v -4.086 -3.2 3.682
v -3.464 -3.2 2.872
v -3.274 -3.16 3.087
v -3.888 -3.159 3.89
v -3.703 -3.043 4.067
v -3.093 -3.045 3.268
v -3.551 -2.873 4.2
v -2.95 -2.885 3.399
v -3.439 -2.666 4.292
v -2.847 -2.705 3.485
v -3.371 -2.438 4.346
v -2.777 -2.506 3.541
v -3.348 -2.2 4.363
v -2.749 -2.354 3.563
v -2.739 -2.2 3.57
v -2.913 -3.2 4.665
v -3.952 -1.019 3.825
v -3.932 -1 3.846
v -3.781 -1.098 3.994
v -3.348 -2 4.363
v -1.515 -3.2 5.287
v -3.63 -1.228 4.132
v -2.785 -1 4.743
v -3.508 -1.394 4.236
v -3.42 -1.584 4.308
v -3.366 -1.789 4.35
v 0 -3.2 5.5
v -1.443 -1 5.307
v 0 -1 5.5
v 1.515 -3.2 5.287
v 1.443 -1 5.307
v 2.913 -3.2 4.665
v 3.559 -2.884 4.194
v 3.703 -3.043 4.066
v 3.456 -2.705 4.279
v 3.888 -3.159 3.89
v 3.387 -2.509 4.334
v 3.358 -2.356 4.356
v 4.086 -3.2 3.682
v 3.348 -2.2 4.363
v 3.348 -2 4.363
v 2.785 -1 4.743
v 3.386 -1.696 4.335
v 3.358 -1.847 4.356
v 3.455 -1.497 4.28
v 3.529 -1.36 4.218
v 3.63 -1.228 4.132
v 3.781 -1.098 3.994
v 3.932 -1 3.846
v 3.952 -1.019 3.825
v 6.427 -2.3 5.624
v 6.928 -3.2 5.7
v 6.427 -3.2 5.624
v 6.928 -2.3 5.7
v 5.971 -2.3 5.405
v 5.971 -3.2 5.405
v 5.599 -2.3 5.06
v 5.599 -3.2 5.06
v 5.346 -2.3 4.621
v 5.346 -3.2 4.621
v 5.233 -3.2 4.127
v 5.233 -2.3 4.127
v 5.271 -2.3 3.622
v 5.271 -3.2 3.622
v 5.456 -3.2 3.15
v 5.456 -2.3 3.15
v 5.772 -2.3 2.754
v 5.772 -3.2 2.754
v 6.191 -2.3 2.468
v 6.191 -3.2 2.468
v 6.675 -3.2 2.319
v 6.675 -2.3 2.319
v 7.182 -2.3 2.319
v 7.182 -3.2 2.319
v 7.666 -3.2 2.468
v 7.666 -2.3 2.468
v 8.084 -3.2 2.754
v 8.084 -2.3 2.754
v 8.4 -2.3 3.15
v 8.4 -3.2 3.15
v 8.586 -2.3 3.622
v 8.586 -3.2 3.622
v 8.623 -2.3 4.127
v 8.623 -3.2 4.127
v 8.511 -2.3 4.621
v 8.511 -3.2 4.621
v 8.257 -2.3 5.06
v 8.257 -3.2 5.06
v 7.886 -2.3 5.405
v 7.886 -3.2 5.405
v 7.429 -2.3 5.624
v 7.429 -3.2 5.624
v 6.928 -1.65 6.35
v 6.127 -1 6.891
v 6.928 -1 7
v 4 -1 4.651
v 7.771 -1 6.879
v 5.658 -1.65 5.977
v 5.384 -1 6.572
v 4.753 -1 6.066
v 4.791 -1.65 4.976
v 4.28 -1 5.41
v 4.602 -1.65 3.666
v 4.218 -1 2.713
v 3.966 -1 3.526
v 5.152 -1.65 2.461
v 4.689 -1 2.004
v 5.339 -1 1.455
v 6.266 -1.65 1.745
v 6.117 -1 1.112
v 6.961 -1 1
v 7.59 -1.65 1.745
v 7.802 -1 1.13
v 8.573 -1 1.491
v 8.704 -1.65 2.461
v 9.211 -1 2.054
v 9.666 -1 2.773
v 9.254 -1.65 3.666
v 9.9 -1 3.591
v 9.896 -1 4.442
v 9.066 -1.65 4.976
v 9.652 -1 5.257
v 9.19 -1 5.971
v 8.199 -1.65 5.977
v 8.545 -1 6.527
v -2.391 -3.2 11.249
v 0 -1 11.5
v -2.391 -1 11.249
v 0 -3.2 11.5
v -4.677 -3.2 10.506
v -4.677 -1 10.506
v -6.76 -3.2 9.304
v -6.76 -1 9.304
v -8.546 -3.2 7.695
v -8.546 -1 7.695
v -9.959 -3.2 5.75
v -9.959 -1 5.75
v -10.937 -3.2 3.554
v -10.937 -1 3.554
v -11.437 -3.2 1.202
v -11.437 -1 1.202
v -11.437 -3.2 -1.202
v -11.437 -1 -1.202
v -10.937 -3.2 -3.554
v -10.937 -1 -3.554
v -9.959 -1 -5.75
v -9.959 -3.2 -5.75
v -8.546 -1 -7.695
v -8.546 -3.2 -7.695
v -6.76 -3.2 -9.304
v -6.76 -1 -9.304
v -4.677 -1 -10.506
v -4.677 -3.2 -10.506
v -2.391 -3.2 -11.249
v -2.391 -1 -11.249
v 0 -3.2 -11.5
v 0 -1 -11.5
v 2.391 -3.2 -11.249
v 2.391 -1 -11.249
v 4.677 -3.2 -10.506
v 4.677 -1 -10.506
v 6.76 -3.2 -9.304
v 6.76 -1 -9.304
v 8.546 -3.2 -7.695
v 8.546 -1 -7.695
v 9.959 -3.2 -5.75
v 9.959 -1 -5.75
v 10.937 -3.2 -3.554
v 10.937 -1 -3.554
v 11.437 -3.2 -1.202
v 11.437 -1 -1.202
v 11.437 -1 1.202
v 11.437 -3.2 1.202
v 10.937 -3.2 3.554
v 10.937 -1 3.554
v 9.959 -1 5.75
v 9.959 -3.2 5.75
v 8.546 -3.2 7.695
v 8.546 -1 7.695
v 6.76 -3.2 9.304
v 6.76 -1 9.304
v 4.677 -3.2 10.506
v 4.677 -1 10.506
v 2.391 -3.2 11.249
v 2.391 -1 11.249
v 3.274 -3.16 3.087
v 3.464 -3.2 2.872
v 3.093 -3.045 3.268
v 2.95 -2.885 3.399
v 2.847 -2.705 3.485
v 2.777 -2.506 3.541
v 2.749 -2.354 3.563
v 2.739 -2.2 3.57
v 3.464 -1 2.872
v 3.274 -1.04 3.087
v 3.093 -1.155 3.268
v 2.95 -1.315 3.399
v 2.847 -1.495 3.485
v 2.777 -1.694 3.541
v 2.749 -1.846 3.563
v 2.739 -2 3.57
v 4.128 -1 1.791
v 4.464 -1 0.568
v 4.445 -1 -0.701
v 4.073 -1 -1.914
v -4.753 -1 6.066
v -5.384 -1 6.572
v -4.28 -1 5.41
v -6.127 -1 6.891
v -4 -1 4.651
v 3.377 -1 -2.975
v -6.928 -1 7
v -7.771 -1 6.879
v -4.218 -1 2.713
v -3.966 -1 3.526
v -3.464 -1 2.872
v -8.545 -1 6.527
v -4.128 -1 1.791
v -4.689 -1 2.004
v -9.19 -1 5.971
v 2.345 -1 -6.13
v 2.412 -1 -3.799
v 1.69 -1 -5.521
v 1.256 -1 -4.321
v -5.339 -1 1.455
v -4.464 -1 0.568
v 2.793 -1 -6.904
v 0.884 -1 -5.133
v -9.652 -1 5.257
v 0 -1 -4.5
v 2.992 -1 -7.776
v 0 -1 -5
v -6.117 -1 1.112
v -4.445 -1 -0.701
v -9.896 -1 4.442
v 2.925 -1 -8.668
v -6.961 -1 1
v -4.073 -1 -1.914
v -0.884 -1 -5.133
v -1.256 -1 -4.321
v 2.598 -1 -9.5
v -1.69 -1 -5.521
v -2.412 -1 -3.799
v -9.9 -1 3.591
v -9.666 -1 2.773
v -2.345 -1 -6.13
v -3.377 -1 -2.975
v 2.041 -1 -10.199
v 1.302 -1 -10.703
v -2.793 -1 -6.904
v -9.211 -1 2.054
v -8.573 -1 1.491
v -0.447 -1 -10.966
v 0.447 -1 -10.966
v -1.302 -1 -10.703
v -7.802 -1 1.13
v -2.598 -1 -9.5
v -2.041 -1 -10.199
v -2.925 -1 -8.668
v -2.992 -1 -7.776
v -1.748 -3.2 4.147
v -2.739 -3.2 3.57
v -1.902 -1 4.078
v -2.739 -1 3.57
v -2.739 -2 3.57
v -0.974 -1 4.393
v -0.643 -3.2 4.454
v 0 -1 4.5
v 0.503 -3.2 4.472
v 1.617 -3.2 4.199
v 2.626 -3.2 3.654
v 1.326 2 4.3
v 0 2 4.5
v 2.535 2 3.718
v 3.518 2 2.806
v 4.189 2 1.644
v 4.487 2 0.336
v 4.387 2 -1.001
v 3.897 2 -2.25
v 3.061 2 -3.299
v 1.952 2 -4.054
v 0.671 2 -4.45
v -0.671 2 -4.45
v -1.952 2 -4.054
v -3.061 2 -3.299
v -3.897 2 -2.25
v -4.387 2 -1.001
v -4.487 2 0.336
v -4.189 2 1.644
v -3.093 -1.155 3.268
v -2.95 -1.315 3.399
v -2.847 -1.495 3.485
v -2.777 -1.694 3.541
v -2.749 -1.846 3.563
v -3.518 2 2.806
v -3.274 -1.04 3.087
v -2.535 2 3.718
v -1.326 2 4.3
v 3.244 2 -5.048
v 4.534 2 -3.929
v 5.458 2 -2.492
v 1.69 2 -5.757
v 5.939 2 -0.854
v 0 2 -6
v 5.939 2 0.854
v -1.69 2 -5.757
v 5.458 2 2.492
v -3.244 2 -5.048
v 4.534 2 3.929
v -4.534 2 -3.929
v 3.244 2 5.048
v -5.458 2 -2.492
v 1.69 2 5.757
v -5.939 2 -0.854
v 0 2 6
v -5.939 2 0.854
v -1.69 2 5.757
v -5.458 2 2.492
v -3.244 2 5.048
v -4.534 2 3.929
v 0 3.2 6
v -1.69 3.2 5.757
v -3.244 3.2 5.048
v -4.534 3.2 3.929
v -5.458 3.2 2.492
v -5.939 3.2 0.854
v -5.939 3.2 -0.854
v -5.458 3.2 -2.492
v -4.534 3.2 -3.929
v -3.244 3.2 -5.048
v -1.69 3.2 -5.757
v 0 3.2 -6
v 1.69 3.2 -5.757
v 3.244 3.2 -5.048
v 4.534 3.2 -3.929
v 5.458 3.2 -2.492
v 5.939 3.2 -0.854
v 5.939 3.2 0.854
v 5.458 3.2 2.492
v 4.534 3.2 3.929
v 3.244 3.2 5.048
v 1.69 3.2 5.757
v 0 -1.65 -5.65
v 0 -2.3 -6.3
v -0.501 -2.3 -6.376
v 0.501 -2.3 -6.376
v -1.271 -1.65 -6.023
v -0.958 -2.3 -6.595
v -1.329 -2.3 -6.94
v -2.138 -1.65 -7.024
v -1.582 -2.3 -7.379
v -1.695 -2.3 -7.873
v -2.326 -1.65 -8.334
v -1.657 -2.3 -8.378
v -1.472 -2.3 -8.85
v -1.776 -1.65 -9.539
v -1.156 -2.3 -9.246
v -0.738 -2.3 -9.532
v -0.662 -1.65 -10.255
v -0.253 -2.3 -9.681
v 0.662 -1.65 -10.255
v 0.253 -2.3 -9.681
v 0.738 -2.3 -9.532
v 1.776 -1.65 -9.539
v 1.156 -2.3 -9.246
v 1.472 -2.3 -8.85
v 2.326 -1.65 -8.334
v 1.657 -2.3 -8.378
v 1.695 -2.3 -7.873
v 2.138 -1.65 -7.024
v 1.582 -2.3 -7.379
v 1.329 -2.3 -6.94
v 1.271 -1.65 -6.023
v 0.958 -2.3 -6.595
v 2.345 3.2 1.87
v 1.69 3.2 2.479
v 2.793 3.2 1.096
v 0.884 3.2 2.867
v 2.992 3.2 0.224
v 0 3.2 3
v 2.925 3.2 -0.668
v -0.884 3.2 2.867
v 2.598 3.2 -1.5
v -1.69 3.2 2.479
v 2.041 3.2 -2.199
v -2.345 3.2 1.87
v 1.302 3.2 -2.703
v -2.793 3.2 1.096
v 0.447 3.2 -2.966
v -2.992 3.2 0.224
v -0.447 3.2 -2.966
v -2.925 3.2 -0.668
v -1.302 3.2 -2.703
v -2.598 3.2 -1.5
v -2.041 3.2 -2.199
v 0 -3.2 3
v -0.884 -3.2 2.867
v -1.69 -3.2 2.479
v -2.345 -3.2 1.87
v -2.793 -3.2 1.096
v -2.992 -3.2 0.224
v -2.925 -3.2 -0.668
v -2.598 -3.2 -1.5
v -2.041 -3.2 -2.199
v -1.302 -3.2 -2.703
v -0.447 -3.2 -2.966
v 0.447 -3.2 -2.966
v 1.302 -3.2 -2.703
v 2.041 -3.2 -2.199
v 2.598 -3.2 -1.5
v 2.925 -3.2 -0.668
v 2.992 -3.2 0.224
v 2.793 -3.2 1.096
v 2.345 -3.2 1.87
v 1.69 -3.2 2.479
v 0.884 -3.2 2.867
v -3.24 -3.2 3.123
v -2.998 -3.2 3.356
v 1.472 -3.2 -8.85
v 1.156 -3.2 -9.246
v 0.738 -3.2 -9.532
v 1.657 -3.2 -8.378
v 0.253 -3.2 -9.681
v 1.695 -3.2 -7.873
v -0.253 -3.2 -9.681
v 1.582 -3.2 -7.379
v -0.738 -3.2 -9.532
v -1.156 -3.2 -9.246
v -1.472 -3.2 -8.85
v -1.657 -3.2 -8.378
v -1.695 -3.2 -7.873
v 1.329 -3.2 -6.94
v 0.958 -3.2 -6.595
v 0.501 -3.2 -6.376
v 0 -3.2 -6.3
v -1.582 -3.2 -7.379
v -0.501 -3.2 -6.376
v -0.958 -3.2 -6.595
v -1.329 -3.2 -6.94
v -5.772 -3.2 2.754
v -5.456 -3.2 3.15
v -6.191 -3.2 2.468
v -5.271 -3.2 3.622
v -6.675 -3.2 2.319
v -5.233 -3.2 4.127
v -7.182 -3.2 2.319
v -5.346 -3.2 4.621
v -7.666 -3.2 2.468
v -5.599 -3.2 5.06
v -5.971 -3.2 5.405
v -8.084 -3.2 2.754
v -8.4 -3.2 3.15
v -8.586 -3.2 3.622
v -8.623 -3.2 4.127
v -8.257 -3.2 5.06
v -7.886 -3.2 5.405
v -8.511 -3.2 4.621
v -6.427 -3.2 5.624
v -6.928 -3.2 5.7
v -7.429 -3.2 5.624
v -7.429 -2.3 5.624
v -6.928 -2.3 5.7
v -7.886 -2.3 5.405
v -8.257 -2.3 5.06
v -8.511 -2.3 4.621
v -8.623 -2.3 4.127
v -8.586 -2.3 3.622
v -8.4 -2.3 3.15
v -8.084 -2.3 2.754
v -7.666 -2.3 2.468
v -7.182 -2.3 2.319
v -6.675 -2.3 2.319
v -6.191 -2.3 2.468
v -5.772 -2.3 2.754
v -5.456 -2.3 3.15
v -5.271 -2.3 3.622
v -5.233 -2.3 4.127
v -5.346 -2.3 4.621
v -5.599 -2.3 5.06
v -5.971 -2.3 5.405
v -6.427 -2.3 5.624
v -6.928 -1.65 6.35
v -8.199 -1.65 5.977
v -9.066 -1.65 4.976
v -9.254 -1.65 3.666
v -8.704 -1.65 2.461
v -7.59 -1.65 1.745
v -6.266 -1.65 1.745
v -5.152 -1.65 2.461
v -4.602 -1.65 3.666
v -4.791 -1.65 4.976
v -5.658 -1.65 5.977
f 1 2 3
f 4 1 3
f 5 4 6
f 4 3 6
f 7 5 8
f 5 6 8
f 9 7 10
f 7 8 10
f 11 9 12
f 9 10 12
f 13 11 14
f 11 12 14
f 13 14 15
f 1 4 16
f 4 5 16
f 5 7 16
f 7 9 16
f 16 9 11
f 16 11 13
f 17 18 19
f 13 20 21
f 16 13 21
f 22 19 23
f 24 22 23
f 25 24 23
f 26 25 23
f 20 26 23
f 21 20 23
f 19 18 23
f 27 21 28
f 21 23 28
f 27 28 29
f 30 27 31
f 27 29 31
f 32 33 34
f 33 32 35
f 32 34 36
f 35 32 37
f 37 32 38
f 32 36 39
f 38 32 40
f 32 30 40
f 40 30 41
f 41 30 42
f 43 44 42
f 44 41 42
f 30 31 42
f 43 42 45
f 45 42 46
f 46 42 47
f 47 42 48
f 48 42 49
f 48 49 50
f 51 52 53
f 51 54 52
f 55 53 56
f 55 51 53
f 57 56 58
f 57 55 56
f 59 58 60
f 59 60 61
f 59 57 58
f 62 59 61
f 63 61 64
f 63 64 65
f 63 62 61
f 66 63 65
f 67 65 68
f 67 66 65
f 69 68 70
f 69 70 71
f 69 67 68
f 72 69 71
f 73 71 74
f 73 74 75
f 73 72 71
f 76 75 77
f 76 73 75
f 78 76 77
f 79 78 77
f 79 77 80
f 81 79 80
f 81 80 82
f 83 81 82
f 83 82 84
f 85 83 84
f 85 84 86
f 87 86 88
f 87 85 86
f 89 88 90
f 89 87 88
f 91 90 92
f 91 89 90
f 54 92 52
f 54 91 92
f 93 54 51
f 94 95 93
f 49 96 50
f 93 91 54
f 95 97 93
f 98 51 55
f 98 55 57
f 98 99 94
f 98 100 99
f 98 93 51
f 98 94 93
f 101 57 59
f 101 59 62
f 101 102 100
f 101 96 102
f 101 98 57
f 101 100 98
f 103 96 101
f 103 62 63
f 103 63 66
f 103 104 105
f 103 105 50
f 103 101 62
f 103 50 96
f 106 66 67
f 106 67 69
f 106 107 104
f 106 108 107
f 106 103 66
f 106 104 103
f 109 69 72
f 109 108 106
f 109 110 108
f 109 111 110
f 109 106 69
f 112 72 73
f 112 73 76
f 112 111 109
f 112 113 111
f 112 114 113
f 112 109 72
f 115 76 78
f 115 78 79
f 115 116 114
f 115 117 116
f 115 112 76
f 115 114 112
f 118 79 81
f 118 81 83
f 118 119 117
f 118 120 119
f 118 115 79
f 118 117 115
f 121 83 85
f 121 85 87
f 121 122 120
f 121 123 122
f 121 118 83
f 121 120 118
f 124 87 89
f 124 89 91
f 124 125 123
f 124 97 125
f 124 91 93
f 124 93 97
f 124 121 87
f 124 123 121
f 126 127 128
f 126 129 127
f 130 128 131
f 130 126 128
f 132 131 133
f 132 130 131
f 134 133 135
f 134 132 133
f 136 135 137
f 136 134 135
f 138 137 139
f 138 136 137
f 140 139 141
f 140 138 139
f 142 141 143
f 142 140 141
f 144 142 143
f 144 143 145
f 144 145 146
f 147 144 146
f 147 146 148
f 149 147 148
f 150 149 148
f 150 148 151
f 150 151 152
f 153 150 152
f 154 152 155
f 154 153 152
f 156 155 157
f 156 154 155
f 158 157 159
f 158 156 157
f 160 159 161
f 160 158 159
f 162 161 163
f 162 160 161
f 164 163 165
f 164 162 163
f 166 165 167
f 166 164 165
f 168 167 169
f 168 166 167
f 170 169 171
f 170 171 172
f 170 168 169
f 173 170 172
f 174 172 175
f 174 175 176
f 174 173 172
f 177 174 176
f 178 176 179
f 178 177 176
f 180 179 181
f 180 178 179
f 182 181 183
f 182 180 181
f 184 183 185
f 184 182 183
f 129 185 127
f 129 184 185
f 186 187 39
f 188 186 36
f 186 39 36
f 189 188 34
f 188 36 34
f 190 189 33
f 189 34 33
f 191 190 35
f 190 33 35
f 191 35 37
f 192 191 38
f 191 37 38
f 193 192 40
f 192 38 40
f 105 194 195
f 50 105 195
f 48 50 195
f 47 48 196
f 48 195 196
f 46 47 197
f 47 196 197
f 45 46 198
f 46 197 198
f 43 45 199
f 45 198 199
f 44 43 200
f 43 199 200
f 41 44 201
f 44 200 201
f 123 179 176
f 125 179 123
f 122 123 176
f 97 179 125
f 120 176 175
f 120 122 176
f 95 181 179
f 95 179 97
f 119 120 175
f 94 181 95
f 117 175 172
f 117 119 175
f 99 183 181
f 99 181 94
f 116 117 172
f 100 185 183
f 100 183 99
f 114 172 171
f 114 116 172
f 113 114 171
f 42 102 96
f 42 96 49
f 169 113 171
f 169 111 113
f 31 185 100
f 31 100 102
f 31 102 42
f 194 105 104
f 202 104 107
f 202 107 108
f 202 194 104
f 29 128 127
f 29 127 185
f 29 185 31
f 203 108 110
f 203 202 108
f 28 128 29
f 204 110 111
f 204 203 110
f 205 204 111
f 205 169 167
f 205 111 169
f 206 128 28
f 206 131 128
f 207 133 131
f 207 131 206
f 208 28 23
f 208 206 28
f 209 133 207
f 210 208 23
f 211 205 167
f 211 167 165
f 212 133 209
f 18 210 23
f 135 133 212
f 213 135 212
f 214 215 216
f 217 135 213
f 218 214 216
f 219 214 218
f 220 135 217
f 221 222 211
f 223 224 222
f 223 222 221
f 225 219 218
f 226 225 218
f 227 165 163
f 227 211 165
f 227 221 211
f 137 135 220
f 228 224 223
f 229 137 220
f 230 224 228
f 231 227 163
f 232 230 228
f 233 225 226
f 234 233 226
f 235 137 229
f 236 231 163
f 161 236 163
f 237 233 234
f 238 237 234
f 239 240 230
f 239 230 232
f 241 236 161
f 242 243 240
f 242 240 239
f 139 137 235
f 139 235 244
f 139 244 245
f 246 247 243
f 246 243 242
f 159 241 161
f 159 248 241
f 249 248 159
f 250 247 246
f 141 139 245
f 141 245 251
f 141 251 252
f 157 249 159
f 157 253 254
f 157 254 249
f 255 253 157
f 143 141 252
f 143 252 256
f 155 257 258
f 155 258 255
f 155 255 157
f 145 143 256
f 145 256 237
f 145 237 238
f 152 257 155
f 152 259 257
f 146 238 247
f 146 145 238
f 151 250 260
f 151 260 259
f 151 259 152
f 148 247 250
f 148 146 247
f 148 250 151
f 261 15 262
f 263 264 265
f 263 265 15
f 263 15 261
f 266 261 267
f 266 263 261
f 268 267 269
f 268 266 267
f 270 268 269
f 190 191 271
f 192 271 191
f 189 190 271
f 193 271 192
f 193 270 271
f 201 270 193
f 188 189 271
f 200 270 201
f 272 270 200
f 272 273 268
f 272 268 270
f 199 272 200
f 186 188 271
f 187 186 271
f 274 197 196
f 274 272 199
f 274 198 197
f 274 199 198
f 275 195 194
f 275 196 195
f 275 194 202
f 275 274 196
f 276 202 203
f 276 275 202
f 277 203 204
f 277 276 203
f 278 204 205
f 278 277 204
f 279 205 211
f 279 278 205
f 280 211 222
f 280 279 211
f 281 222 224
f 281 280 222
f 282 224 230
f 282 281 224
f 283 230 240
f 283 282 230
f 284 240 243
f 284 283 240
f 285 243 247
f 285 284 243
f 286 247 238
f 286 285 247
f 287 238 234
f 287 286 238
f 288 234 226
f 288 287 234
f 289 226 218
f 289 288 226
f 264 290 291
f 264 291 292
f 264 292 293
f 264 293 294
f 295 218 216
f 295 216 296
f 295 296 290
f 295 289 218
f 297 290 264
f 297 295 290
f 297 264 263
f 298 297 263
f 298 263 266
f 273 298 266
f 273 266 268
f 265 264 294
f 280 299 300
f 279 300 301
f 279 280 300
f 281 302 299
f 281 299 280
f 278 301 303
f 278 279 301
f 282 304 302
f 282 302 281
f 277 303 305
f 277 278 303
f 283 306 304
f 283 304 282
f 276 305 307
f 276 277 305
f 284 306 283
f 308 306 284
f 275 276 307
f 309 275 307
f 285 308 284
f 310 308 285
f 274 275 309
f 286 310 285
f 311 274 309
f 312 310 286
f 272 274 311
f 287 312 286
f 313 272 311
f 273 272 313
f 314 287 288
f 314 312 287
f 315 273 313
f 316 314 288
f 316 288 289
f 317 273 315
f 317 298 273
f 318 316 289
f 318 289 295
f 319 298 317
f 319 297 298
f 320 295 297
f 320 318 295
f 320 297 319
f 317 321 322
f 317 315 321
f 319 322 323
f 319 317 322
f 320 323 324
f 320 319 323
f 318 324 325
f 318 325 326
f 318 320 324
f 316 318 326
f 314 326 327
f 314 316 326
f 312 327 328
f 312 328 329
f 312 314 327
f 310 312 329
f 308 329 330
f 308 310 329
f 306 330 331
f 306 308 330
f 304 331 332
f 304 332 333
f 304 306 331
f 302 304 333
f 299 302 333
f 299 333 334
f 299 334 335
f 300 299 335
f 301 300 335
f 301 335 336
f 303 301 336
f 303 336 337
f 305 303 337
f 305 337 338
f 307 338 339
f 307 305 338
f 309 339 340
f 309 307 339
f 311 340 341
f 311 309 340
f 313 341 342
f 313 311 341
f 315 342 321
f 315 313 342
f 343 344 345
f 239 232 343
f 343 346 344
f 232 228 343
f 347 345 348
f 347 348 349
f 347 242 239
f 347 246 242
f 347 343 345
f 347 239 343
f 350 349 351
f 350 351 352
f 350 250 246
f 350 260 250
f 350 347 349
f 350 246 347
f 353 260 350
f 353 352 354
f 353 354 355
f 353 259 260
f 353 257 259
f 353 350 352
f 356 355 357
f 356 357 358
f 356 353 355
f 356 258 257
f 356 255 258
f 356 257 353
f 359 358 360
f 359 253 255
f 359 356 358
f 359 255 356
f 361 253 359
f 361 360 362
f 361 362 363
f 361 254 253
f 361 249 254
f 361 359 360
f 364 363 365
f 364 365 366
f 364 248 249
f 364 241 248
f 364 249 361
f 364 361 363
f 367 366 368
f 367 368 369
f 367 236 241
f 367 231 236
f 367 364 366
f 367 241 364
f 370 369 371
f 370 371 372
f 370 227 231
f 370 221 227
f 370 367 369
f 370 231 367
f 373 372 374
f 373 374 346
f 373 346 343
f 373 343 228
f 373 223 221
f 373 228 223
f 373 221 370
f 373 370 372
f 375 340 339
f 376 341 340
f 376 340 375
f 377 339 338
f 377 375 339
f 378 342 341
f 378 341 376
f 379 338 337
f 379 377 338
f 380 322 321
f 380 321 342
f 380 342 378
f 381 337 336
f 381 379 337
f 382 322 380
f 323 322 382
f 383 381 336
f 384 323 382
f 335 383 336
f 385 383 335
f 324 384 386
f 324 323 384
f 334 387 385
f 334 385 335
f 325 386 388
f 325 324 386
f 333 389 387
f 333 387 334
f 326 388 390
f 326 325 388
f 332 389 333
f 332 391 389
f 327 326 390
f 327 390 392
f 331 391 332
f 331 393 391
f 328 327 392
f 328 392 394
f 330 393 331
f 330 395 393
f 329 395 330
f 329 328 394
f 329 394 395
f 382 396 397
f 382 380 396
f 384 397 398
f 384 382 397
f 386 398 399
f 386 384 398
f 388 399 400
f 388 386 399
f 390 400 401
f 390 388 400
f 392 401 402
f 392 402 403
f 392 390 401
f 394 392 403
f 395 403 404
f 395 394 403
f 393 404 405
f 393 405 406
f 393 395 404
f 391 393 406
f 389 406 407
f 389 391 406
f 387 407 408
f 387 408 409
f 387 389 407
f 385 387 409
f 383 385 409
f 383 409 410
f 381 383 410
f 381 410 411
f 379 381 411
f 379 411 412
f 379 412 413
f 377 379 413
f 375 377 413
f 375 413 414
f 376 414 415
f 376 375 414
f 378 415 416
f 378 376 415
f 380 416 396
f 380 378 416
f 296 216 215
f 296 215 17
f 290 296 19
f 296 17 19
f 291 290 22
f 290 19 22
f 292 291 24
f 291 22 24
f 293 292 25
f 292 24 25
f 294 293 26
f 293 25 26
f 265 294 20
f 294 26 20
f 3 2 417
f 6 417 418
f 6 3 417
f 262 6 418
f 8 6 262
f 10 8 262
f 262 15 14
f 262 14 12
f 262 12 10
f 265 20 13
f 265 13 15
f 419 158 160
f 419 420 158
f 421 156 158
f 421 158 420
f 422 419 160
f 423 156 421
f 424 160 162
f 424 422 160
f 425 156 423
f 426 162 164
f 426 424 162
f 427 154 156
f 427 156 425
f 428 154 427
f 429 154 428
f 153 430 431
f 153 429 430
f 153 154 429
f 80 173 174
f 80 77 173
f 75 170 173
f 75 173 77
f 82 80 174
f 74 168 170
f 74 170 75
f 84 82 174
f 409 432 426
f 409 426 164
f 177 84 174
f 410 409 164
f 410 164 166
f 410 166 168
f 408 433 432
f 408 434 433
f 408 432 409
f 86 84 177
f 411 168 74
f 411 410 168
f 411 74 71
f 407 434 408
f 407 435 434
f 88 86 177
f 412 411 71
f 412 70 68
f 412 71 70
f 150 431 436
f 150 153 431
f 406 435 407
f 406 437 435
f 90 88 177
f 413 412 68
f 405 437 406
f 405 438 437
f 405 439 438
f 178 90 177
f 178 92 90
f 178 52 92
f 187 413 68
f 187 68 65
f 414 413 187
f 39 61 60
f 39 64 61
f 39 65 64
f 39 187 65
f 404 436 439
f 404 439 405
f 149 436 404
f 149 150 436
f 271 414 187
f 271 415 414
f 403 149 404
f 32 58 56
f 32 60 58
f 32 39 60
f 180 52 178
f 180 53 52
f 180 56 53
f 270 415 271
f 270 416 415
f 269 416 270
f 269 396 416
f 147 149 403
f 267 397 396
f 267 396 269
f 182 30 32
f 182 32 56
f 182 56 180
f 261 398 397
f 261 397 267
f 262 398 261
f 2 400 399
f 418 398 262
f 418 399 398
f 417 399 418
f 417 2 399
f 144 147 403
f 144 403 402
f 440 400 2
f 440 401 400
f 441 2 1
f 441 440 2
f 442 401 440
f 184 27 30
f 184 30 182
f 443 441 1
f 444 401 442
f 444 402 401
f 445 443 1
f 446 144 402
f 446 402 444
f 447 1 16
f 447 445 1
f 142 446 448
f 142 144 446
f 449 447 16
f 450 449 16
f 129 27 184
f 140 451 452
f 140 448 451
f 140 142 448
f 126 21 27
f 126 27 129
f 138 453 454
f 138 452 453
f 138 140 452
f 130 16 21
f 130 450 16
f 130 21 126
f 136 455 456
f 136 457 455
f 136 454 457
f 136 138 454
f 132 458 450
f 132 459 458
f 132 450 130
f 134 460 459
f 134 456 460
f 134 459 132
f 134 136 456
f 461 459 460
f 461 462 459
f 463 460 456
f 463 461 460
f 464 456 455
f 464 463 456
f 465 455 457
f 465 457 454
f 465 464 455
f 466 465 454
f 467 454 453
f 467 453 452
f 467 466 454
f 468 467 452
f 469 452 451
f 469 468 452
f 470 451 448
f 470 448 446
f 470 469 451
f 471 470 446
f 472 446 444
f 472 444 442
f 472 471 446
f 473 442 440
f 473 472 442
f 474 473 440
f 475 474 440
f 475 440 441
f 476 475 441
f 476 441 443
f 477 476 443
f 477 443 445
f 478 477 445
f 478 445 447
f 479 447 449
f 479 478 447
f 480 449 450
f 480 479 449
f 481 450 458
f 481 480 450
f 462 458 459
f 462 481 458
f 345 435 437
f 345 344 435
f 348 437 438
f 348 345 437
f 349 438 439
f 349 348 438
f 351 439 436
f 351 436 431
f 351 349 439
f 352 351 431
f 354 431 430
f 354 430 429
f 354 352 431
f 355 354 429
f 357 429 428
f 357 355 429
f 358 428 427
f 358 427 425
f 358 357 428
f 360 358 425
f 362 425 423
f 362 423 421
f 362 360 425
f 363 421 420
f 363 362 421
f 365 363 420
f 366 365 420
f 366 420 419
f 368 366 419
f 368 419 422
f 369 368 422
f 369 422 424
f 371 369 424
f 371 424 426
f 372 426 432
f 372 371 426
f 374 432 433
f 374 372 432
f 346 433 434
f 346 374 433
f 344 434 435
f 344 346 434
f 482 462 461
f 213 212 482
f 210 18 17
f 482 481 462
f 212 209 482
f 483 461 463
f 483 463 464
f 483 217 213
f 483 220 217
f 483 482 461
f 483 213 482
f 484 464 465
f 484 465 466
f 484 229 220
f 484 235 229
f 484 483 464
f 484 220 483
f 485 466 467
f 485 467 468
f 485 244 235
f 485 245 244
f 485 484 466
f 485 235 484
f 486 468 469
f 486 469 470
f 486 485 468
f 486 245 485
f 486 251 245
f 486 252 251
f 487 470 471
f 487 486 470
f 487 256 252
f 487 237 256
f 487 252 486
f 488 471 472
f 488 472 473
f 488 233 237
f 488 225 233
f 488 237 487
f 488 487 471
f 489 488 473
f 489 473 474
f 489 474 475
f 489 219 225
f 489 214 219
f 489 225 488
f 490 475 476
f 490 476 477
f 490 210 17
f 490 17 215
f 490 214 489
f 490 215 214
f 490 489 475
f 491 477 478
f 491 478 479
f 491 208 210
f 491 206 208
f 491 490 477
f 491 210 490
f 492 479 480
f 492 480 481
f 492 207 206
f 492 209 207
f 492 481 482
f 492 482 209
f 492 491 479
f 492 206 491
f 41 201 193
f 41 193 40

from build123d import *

# Parameters (mm, degrees)
CSK_FOR_M3_FLAT_HEAD_MACHINE_SCREW1_AT_2_COUNT = 2
CSK_FOR_M3_FLAT_HEAD_MACHINE_SCREW1_AT_2_PITCH = 13.856406460551039
CSK_FOR_M3_FLAT_HEAD_MACHINE_SCREW1_AT_3_COUNT = 2
CSK_FOR_M3_FLAT_HEAD_MACHINE_SCREW1_AT_3_PITCH = 13.856406460550982
ENL_V_MAT_EXTRU_1_DEPTH                        = 17.797023545854785
CONG_1_R                                       = 1


with BuildPart() as part:
    # Esquisse1 → Révolution1 (revolve)
    with BuildSketch(Plane.XY, mode=Mode.PRIVATE) as r_volution1_sk:
        Polygon((2.9999999999999996, -3.2), (2.9999999999999996, 3.2), (5.999999999999998, 3.2), (5.999999999999998, 2), (4.499999999999998, 2), (4.5, -1), (11.500000000000002, -1), (11.500000000000002, -3.2), align=None)
    revolve(r_volution1_sk.sketch.rotate(Axis((0, 4.689873417721518, 0), (0, -1, 0)), 90), axis=Axis((0, 4.689873417721518, 0), (0, -1, 0)))

    # Esquisse4 → CSK for M3 Flat Head Machine Screw1 (revolve, cut)
    with BuildSketch(Plane(origin=(-6.928203230275546, -1, 3.999999999999936), x_dir=(0, 0, 1), z_dir=(1, 0, 0))):
        Polygon((0, 0), (-5.4e-16, 2.2), (1.6999999999999995, 2.2), (1.6999999999999997, 1.3000000000000007), (3, 0), align=None)
    csk_for_m3_flat_head_machine_screw1 = revolve(axis=Axis((-6.928203230275546, 5.349999999999991, 3.999999999999936), (0, -1, 0)), mode=Mode.SUBTRACT)

    # CSK for M3 Flat Head Machine Screw1 at 2: CSK for M3 Flat Head Machine Screw1 ×2
    with Locations(*[(i * CSK_FOR_M3_FLAT_HEAD_MACHINE_SCREW1_AT_2_PITCH, 0, 0) for i in range(1, CSK_FOR_M3_FLAT_HEAD_MACHINE_SCREW1_AT_2_COUNT)]):
        add(csk_for_m3_flat_head_machine_screw1, mode=Mode.SUBTRACT)

    # CSK for M3 Flat Head Machine Screw1 at 3: CSK for M3 Flat Head Machine Screw1 ×2
    with Locations(*[Vector(0.5000000000000041, 0, -0.8660254037844364) * (i * CSK_FOR_M3_FLAT_HEAD_MACHINE_SCREW1_AT_3_PITCH) for i in range(1, CSK_FOR_M3_FLAT_HEAD_MACHINE_SCREW1_AT_3_COUNT)]):
        add(csk_for_m3_flat_head_machine_screw1, mode=Mode.SUBTRACT)

    # Esquisse6 → Enlèv. mat.-Extru.1 (cut, through all)
    with BuildSketch(Plane(origin=(0, -1, 0), x_dir=(1, 0, 0), z_dir=(0, 1, 0))):
        with BuildLine():
            Line((2.739426430539251, -3.5700900313105515), (3.348187859547974, -4.363443371601785))
            ThreePointArc((3.348187859547974, -4.363443371601785), (2.78e-15, -5.5), (-3.3481878595479704, -4.363443371601789))
            Line((-3.3481878595479704, -4.363443371601789), (-2.7394264305392486, -3.5700900313105546))
            ThreePointArc((-2.7394264305392486, -3.5700900313105546), (2.27e-15, -4.499999999999999), (2.739426430539251, -3.5700900313105515))
        make_face()
    extrude(amount=-ENL_V_MAT_EXTRU_1_DEPTH, mode=Mode.SUBTRACT)

    # Congé1
    # the kernel refuses this fillet: 1 mm, written as the material it takes off along each edge
    with BuildSketch(Plane(origin=(4.870091432069782, -3.2, 6.346826722329871), x_dir=(0.7933533402912335, 0, -0.608761429008723), z_dir=(-0.608761429008723, 0, -0.7933533402912334))) as cong_1_piece_1_section:
        with BuildLine():
            CenterArc((CONG_1_R, -CONG_1_R), CONG_1_R, 90, 90)
            Line((0, -CONG_1_R), (0, 0))
            Line((0, 0), (CONG_1_R, 0))
        make_face()
    cong_1_piece_1 = extrude(amount=6.0000000000000036, mode=Mode.PRIVATE)
    cong_1_piece_1 = cong_1_piece_1 - Plane(origin=(-8.9e-16, -2.973934992670689, -7.55e-15), x_dir=(-0.6087614290087209, 0, 0.7933533402912349), z_dir=(0, 1, 0)) * Cylinder(4.500000000000007, 17, mode=Mode.PRIVATE)
    cong_1_piece_1 = cong_1_piece_1 & Plane(origin=(-4.4e-16, -2.973934992670689, -1.78e-15), x_dir=(0.6087614290087225, 0, 0.7933533402912338), z_dir=(0, 1, 0)) * Cylinder(5.500000000000003, 17, mode=Mode.PRIVATE)
    add(cong_1_piece_1, mode=Mode.SUBTRACT)
    with BuildSketch(Plane(origin=(-1.2175228580174442, -3.2, 1.586706680582469), x_dir=(-0.7933533402912343, 0, -0.608761429008722), z_dir=(-0.6087614290087219, 0, 0.7933533402912343))) as cong_1_piece_2_section:
        with BuildLine():
            CenterArc((CONG_1_R, -CONG_1_R), CONG_1_R, 90, 90)
            Line((-9e-17, -CONG_1_R), (0, 0))
            Line((0, 0), (CONG_1_R, 0))
        make_face()
    cong_1_piece_2 = extrude(amount=6, mode=Mode.PRIVATE)
    cong_1_piece_2 = cong_1_piece_2 - Plane(origin=(-8.9e-16, -2.973934929539706, -7.55e-15), x_dir=(-0.6087614290087209, 0, 0.7933533402912349), z_dir=(0, 1, 0)) * Cylinder(4.500000000000007, 16, mode=Mode.PRIVATE)
    cong_1_piece_2 = cong_1_piece_2 & Plane(origin=(-4.4e-16, -2.973934929539706, -1.78e-15), x_dir=(0.6087614290087225, 0, 0.7933533402912338), z_dir=(0, 1, 0)) * Cylinder(5.500000000000003, 16, mode=Mode.PRIVATE)
    add(cong_1_piece_2, mode=Mode.SUBTRACT)
    with BuildSketch(Plane(origin=(-4.870091432069775, -1, 6.346826722329874), x_dir=(0, -1, 0), z_dir=(0.6087614290087219, 0, -0.7933533402912343))) as cong_1_piece_3_section:
        with BuildLine():
            CenterArc((CONG_1_R, CONG_1_R), CONG_1_R, 180.00000000000003, 90)
            Line((0, CONG_1_R), (0, 0))
            Line((0, 0), (CONG_1_R, 0))
        make_face()
    cong_1_piece_3 = extrude(amount=6, mode=Mode.PRIVATE)
    cong_1_piece_3 = cong_1_piece_3 - Plane(origin=(-8.9e-16, -1.2260647234530146, -7.55e-15), x_dir=(-0.6087614290087209, 0, 0.7933533402912349), z_dir=(0, 1, 0)) * Cylinder(4.500000000000007, 16, mode=Mode.PRIVATE)
    cong_1_piece_3 = cong_1_piece_3 & Plane(origin=(-4.4e-16, -1.2260647234530146, -1.78e-15), x_dir=(0.6087614290087225, 0, 0.7933533402912338), z_dir=(0, 1, 0)) * Cylinder(5.500000000000003, 16, mode=Mode.PRIVATE)
    add(cong_1_piece_3, mode=Mode.SUBTRACT)
    with BuildSketch(Plane(origin=(1.2175228580174433, -1, 1.586706680582468), x_dir=(2.1e-16, -1, -1.6e-16), z_dir=(0.608761429008723, 0, 0.7933533402912334))) as cong_1_piece_4_section:
        with BuildLine():
            CenterArc((CONG_1_R, CONG_1_R), CONG_1_R, 180, 90)
            Line((2.7e-16, CONG_1_R), (0, 0))
            Line((0, 0), (CONG_1_R, 0))
        make_face()
    cong_1_piece_4 = extrude(amount=6, mode=Mode.PRIVATE)
    cong_1_piece_4 = cong_1_piece_4 - Plane(origin=(-8.9e-16, -1.226064411710552, -7.55e-15), x_dir=(-0.6087614290087209, 0, 0.7933533402912349), z_dir=(0, 1, 0)) * Cylinder(4.500000000000007, 16, mode=Mode.PRIVATE)
    cong_1_piece_4 = cong_1_piece_4 & Plane(origin=(-4.4e-16, -1.226064411710552, -1.78e-15), x_dir=(0.6087614290087225, 0, 0.7933533402912338), z_dir=(0, 1, 0)) * Cylinder(5.500000000000003, 16, mode=Mode.PRIVATE)
    add(cong_1_piece_4, mode=Mode.SUBTRACT)


solid = part.part
